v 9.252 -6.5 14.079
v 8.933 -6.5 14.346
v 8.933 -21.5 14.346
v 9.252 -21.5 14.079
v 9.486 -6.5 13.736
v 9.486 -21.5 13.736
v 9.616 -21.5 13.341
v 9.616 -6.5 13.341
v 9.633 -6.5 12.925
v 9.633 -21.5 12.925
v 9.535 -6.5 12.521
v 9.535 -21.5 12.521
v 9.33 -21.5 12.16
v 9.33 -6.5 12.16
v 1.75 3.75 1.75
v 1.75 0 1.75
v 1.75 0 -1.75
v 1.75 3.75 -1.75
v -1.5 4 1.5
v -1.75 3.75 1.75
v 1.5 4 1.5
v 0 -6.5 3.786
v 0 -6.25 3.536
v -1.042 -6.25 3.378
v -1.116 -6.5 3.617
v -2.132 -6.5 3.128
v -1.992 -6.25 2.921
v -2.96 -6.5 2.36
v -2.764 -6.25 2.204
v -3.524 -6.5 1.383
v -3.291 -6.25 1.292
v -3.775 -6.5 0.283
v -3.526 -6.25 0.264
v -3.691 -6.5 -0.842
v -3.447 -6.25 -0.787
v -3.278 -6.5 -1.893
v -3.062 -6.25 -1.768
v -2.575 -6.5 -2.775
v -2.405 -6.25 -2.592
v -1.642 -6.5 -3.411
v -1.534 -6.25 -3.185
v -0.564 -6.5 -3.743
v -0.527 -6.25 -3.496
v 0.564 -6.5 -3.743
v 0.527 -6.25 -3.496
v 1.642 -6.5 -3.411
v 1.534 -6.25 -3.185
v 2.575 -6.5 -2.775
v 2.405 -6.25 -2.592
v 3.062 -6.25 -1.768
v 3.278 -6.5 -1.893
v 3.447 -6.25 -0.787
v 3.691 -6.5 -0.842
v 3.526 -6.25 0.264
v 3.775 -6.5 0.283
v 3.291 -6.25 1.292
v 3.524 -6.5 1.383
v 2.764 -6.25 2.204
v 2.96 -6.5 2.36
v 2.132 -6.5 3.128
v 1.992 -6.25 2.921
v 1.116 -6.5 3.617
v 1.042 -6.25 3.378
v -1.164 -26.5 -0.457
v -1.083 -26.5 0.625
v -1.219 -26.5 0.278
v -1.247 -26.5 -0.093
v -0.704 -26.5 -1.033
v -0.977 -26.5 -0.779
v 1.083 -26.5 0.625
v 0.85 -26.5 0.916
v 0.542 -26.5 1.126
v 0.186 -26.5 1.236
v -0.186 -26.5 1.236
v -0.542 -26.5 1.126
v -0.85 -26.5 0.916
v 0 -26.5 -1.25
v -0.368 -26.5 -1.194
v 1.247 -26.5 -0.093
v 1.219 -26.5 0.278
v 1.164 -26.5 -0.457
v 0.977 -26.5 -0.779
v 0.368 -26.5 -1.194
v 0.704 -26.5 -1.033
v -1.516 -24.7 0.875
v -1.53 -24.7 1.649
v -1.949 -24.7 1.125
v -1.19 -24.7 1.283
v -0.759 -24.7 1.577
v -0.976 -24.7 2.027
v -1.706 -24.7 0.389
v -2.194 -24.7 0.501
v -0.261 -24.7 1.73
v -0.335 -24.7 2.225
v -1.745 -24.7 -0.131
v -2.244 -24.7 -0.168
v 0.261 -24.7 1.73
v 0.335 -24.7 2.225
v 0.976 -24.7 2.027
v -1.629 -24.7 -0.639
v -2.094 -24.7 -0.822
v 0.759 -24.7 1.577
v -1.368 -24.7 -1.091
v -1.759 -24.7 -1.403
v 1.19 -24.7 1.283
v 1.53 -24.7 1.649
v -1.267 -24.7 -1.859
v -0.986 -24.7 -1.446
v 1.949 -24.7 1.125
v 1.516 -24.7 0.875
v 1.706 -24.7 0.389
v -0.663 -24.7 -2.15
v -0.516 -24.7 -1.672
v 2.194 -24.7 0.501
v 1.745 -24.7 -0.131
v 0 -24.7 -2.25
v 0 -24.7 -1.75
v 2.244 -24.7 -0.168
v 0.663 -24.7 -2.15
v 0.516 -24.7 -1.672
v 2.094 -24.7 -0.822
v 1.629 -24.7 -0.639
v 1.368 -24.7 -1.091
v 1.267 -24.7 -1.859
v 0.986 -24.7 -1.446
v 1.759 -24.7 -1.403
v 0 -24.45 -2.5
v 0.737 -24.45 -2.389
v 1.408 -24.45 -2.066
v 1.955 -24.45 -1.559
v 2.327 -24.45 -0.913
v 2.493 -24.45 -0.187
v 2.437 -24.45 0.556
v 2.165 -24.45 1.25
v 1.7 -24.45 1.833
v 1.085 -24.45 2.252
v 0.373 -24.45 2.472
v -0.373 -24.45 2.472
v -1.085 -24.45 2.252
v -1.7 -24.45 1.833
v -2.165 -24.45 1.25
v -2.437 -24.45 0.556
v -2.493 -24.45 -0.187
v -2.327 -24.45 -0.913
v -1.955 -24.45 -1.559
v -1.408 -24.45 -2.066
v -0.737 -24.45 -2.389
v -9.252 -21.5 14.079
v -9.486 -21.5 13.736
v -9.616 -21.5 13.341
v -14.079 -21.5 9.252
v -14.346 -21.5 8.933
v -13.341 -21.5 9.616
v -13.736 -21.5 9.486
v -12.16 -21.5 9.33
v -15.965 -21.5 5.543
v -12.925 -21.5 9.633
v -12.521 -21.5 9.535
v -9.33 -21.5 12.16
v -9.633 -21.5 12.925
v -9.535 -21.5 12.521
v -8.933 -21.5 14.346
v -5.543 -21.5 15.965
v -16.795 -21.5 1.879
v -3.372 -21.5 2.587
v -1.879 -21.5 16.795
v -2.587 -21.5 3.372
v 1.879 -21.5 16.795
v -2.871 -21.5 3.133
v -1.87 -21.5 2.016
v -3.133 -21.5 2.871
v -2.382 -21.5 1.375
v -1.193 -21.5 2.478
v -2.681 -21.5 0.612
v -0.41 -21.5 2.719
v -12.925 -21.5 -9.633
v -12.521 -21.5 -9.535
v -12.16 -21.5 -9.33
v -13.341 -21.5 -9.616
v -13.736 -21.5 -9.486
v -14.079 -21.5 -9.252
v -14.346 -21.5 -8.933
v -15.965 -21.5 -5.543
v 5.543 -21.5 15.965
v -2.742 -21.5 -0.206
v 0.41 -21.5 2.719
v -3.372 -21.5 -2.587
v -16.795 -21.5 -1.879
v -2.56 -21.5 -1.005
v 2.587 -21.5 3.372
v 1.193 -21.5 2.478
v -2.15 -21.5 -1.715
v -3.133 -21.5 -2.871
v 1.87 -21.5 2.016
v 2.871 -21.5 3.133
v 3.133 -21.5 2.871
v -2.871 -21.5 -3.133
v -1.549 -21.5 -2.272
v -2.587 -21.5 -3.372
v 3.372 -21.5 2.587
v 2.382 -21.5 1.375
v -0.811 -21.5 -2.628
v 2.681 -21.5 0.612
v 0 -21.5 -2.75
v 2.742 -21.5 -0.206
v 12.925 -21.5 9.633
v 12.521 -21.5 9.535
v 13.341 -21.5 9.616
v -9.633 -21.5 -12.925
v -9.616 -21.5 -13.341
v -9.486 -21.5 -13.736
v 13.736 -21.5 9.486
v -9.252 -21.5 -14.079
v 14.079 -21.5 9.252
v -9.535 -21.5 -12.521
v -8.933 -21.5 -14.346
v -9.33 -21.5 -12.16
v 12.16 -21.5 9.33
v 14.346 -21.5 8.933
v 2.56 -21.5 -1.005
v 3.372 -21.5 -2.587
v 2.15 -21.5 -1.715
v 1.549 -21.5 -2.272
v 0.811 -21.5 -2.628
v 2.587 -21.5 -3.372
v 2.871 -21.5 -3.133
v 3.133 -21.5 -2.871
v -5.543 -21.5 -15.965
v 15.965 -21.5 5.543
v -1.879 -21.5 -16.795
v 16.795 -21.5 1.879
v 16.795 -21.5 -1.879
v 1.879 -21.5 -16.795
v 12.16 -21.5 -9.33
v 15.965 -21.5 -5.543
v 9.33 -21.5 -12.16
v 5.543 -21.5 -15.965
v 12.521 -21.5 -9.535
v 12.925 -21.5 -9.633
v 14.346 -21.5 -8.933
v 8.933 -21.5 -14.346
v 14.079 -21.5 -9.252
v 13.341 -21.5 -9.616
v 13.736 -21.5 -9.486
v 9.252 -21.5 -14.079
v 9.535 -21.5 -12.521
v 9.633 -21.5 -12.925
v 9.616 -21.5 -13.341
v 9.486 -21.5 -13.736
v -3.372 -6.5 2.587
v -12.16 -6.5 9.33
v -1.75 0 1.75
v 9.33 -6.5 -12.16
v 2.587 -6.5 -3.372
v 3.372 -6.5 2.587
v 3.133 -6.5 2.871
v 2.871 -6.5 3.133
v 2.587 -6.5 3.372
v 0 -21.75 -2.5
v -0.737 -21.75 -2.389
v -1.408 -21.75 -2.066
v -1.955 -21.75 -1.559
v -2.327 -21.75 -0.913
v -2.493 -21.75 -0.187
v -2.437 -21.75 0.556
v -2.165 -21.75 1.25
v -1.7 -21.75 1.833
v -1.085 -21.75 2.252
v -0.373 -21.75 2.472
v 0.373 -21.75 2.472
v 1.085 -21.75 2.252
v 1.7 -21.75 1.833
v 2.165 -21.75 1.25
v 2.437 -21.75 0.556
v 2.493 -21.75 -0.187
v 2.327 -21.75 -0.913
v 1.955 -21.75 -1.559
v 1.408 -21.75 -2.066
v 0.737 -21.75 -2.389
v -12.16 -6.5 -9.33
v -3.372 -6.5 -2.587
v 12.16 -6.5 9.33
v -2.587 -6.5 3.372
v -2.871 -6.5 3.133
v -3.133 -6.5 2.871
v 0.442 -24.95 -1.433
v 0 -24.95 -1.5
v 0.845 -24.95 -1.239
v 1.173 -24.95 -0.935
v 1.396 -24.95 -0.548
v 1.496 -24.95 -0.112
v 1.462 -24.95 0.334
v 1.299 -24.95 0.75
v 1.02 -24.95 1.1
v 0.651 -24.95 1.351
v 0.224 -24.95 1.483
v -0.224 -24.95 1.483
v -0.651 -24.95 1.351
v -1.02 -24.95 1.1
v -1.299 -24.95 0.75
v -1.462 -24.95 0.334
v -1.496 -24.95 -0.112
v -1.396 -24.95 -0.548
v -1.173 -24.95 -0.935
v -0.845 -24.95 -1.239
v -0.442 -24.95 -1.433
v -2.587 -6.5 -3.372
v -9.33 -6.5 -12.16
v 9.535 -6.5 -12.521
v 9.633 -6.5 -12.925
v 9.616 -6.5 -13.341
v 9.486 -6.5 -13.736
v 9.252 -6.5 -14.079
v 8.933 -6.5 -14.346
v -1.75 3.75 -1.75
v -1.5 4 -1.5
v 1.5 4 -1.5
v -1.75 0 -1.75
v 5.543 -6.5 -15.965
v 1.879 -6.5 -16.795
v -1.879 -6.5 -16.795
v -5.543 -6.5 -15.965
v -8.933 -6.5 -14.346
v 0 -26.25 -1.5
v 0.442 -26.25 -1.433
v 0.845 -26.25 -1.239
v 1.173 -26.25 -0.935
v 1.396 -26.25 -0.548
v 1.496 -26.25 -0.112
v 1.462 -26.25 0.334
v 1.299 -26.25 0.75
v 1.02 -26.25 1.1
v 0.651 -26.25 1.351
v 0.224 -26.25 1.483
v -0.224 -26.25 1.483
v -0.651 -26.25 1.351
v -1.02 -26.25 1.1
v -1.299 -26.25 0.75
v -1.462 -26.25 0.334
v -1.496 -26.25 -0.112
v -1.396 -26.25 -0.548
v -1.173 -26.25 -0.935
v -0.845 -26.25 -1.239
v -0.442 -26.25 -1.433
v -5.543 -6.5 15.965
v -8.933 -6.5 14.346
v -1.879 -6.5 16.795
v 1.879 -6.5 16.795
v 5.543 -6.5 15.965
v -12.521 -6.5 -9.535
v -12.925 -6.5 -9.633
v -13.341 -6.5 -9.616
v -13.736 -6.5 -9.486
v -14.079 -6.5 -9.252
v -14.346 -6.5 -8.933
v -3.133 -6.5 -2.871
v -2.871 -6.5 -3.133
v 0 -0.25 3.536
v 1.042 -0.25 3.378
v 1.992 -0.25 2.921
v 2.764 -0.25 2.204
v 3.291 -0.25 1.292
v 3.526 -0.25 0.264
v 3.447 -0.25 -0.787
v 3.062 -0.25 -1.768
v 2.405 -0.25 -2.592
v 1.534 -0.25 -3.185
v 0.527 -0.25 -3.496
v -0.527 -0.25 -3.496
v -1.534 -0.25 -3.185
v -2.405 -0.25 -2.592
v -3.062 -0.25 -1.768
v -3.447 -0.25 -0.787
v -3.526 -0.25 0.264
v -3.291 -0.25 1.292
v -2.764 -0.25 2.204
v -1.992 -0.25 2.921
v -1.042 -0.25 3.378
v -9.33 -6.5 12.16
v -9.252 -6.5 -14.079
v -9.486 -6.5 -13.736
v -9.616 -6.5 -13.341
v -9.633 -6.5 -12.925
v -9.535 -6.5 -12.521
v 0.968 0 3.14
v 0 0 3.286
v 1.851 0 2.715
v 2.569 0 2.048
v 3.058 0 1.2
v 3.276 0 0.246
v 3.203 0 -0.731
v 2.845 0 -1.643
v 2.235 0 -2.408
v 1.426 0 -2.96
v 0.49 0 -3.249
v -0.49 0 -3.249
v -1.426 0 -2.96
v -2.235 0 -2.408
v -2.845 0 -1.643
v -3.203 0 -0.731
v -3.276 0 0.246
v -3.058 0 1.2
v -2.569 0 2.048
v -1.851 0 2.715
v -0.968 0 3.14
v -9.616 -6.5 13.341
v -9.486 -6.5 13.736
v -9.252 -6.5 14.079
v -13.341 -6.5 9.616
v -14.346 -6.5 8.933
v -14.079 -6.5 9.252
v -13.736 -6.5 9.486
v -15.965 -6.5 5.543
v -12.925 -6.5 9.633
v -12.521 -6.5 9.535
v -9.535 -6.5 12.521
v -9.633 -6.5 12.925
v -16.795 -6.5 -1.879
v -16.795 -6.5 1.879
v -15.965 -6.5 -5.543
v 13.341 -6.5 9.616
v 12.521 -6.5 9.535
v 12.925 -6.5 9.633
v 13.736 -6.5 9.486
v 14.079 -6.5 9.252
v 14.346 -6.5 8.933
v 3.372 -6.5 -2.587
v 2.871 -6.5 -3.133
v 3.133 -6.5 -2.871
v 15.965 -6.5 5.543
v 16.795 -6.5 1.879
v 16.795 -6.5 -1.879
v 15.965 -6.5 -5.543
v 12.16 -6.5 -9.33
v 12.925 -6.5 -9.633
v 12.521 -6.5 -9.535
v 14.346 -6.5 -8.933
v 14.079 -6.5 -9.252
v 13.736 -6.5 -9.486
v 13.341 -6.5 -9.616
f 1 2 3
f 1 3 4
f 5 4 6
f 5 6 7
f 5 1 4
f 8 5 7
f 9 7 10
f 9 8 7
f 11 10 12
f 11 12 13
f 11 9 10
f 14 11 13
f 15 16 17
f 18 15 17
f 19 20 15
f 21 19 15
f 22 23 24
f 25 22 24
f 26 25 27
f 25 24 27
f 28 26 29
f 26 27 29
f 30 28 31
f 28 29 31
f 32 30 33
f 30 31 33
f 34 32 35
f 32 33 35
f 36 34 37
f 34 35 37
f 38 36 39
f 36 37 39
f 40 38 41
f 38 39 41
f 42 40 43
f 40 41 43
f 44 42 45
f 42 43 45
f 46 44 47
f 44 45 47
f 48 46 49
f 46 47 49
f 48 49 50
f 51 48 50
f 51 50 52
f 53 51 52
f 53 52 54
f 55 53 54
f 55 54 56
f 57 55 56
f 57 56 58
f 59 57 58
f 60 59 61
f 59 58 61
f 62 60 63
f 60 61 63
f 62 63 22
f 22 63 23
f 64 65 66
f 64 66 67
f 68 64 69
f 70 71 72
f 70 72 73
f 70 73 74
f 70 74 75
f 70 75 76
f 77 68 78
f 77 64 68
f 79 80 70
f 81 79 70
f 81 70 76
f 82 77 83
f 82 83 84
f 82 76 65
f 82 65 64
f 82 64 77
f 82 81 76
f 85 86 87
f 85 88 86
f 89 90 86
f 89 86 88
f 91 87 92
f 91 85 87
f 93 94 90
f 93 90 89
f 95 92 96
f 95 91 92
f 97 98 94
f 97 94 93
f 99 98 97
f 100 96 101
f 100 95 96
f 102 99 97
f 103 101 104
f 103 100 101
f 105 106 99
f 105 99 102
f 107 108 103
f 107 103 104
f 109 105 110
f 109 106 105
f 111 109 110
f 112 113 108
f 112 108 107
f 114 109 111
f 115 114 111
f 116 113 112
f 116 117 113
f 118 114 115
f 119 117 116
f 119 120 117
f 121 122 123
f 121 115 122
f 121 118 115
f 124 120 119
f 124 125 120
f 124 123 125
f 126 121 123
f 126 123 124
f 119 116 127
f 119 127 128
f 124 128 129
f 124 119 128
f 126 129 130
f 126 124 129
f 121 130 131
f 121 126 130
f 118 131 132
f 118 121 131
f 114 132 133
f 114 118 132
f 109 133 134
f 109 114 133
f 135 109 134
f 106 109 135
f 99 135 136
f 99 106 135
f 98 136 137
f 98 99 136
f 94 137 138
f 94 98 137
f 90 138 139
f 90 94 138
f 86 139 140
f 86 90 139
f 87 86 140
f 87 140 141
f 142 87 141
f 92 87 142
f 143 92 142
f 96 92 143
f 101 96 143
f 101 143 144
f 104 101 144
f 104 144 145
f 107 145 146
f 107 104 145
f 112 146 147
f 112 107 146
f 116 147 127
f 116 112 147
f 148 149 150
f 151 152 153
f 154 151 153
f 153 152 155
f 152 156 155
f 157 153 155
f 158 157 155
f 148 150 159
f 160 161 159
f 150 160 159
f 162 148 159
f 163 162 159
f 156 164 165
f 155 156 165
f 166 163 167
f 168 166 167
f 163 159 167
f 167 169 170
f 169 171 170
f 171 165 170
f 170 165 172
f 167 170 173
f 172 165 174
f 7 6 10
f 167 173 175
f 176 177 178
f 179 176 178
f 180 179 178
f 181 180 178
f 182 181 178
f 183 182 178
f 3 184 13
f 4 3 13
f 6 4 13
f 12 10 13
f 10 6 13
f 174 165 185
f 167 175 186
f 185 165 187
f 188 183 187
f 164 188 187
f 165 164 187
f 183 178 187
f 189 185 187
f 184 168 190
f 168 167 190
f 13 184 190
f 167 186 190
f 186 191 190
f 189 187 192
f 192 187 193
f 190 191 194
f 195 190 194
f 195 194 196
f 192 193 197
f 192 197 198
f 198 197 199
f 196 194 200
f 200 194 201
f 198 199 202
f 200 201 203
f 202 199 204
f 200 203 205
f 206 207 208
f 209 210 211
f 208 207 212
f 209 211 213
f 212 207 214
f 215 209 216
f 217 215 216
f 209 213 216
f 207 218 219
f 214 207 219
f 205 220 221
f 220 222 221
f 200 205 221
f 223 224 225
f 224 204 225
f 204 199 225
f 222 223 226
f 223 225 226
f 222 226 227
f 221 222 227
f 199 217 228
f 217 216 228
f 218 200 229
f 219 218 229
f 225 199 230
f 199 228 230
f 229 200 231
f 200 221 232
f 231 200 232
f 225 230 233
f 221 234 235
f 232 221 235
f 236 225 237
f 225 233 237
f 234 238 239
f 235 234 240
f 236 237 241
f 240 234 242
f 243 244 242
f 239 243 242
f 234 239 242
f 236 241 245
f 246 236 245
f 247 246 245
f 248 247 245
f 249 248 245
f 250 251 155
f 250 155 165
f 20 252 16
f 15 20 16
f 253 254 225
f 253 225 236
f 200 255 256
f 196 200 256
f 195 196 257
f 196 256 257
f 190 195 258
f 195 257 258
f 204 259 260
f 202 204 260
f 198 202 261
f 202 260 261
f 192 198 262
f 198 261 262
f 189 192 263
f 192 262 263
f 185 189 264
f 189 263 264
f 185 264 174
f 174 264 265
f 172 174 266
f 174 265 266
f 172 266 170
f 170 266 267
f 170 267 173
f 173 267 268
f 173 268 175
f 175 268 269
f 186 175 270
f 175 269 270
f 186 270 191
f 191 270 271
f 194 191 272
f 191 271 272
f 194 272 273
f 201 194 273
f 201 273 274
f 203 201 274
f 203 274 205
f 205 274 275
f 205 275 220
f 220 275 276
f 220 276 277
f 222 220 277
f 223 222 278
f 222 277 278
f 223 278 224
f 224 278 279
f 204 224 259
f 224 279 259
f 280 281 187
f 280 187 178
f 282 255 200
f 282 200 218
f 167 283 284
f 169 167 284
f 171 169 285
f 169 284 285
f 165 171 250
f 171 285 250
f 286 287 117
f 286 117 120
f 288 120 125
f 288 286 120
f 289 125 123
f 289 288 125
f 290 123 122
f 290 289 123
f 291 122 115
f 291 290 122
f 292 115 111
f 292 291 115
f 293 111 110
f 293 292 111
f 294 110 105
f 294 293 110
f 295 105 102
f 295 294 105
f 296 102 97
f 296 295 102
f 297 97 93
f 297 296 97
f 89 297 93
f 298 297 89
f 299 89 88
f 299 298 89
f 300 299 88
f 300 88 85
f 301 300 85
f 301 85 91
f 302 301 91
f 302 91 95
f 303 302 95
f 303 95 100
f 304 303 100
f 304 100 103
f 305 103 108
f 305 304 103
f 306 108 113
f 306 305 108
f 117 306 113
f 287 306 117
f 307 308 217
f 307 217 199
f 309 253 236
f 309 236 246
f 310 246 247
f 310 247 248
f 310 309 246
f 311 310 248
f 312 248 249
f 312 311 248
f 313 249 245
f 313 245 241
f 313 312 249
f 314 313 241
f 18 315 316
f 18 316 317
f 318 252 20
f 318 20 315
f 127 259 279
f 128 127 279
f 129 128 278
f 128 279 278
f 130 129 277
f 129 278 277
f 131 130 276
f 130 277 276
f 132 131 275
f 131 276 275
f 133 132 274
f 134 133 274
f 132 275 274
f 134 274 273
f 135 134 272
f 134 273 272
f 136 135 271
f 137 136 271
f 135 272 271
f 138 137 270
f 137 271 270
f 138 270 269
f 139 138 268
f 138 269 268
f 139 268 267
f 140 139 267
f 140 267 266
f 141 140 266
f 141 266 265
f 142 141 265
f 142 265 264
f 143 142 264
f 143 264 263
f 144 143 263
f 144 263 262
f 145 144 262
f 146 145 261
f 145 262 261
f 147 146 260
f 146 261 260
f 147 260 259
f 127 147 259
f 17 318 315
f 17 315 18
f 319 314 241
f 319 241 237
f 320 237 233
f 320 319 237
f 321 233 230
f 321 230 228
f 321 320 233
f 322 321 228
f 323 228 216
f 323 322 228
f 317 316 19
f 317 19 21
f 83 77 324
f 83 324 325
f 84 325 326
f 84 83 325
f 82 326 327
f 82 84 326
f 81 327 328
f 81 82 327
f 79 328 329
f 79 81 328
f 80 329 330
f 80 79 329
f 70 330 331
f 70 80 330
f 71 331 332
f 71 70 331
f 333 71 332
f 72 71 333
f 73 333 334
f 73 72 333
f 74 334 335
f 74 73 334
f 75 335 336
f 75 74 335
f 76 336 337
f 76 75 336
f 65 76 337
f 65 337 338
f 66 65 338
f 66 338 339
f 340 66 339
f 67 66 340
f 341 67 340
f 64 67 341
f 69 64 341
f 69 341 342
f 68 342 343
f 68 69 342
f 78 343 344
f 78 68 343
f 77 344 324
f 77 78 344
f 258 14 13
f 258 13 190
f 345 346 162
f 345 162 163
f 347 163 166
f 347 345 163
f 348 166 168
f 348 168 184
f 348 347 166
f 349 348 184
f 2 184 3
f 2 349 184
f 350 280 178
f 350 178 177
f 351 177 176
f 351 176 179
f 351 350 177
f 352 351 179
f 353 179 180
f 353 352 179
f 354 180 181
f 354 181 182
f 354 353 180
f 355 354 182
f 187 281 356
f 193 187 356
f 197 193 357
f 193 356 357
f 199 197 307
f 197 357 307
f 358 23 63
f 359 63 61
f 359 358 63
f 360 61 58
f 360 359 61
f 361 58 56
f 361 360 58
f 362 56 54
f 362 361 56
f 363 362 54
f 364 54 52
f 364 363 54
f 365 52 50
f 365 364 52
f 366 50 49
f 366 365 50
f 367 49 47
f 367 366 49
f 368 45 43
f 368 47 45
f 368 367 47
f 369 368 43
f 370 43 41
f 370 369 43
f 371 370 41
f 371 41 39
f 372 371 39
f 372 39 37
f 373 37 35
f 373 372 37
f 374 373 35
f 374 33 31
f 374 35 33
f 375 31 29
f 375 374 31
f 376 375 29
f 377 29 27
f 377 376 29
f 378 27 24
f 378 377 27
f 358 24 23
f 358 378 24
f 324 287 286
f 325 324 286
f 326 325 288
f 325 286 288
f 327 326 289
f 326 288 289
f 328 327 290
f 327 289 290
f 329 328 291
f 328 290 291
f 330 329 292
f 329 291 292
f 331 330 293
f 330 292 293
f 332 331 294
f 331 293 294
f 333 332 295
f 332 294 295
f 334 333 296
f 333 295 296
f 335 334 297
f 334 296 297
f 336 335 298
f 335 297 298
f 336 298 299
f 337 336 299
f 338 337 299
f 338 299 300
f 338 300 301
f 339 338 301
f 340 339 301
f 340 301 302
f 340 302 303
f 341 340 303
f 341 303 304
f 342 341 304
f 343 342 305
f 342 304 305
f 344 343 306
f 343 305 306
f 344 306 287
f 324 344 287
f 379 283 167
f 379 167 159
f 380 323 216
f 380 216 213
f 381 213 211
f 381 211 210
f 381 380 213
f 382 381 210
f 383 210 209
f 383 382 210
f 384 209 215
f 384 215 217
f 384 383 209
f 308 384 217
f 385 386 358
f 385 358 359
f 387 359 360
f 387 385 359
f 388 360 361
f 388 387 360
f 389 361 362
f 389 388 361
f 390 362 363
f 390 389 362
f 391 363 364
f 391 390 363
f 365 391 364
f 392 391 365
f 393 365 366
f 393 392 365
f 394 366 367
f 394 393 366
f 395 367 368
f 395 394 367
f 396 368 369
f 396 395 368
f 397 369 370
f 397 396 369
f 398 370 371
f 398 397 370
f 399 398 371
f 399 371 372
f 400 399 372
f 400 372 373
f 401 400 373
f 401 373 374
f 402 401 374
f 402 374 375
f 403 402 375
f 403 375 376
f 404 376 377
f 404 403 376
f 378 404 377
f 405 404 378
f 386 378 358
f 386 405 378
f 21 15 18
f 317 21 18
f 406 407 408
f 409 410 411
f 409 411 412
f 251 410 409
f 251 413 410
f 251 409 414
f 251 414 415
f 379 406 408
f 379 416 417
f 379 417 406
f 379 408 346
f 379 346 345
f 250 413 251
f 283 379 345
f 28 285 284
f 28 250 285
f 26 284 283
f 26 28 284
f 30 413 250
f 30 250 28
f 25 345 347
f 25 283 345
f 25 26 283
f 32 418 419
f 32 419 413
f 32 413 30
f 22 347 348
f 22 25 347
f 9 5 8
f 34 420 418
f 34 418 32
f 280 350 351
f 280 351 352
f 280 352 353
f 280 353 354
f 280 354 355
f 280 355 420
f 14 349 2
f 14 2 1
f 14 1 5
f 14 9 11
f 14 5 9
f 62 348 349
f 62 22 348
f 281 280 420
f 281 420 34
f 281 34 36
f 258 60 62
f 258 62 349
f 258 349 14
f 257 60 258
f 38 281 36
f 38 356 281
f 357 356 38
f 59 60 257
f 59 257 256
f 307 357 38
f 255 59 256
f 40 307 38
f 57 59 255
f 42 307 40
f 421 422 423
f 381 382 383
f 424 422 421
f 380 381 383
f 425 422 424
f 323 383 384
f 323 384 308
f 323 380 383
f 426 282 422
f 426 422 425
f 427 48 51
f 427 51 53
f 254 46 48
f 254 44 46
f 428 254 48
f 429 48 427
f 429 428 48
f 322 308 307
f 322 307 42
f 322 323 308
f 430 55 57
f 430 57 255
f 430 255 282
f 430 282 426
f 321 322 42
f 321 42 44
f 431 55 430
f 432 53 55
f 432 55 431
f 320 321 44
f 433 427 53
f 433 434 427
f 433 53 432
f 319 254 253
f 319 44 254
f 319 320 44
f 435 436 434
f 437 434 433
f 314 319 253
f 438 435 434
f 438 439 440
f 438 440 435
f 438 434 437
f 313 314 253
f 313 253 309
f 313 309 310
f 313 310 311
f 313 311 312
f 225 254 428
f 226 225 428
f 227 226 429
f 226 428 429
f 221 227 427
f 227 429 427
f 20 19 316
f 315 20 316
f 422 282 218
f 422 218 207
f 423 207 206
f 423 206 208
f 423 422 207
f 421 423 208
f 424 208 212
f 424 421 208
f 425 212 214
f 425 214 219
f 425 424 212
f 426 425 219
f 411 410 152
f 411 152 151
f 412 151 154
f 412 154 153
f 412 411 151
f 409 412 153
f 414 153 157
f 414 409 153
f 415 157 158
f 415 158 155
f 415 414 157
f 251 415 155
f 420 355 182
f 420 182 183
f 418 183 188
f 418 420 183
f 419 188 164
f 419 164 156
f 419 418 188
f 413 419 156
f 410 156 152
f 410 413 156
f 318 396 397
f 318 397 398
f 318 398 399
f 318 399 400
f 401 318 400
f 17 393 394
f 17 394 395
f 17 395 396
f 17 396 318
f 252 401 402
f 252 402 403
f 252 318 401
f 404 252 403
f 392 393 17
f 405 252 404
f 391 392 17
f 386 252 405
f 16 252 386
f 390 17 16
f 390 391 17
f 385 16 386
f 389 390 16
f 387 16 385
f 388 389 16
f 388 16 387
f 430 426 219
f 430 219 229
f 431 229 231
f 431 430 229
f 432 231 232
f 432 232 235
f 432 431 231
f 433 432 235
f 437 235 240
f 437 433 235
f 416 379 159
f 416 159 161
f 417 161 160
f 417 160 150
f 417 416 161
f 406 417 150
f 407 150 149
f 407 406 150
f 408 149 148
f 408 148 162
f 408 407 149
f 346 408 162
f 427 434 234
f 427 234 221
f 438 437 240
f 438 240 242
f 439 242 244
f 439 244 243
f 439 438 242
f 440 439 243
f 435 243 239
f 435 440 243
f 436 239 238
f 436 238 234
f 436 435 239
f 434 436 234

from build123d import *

# Parameters (mm, degrees)
SKETCH1_R           = 3.535533906
BOSS_EXTRUDE1_DEPTH = 6.5
SKETCH1_6_W         = 3.5
SKETCH1_6_H         = 3.5
BOSS_EXTRUDE2_DEPTH = 4
SKETCH4_R           = 4.25
BOSS_EXTRUDE5_DEPTH = 15
SKETCH2_R           = 2.5
BOSS_EXTRUDE3_DEPTH = 3.2
SKETCH3_R           = 1.5
BOSS_EXTRUDE4_DEPTH = 1.8
BOSS_EXTRUDE6_DEPTH = 15
CHAMFER1_SIZE       = 0.25


with BuildPart() as part:
    # Sketch1 → Boss-Extrude1 (new body)
    with BuildSketch(Plane(origin=(0, 0, 0), x_dir=(1, 0, 0), z_dir=(0, 1, 0))):
        with Locations(Location((0, 0, 0), (0, 0, 270))):
            Circle(SKETCH1_R)
    extrude(amount=-BOSS_EXTRUDE1_DEPTH)

    # Sketch1<6> → Boss-Extrude2 (add)
    with BuildSketch(Plane(origin=(0, 0, 0), x_dir=(1, 0, 0), z_dir=(0, 1, 0))):
        Rectangle(SKETCH1_6_W, SKETCH1_6_H)
    extrude(amount=BOSS_EXTRUDE2_DEPTH)

    # Sketch4 → Boss-Extrude5 (add)
    with BuildSketch(Plane.XZ.offset(6.5)):
        with Locations(Location((0, 0, 0), (0, 0, 270))):
            Circle(SKETCH4_R)
    extrude(amount=BOSS_EXTRUDE5_DEPTH)

    # Sketch2 → Boss-Extrude3 (add)
    with BuildSketch(Plane.XZ.offset(21.5)):
        with Locations(Location((0, 0, 0), (0, 0, 270))):
            Circle(SKETCH2_R)
    extrude(amount=BOSS_EXTRUDE3_DEPTH)

    # Sketch3 → Boss-Extrude4 (add)
    with BuildSketch(Plane.XZ.offset(24.7)):
        with Locations(Location((0, 0, 0), (0, 0, 270))):
            Circle(SKETCH3_R)
    extrude(amount=BOSS_EXTRUDE4_DEPTH)

    # Sketch5 → Boss-Extrude6 (add)
    with BuildSketch(Plane(origin=(0, -6.5, 0), x_dir=(1, 0, 0), z_dir=(0, 1, 0))):
        with BuildLine():
            Line((-9.330348818, 12.159547317), (-1.19003001, 1.550877304))
            ThreePointArc((-1.19003001, 1.550877304), (0, 0.964019448), (1.19003001, 1.550877304))
            Line((1.19003001, 1.550877304), (9.330348818, 12.159547317))
            ThreePointArc((9.330348818, 12.159547317), (9.616170653, 13.340759097), (8.933207003, 14.346003368))
            ThreePointArc((8.933207003, 14.346003368), (0, 16.9), (-8.933207003, 14.346003368))
            ThreePointArc((-8.933207003, 14.346003368), (-9.616170653, 13.340759097), (-9.330348818, 12.159547317))
        make_face()
        with BuildLine():
            Line((12.159547317, 9.330348818), (1.550877304, 1.19003001))
            ThreePointArc((1.550877304, 1.19003001), (0.964019448, 0), (1.550877304, -1.19003001))
            Line((1.550877304, -1.19003001), (12.159547317, -9.330348818))
            ThreePointArc((12.159547317, -9.330348818), (13.340759097, -9.616170653), (14.346003368, -8.933207003))
            ThreePointArc((14.346003368, -8.933207003), (16.9, 0), (14.346003368, 8.933207003))
            ThreePointArc((14.346003368, 8.933207003), (13.340759097, 9.616170653), (12.159547317, 9.330348818))
        make_face()
        with BuildLine():
            Line((9.330348818, -12.159547317), (1.19003001, -1.550877304))
            ThreePointArc((1.19003001, -1.550877304), (0, -0.964019448), (-1.19003001, -1.550877304))
            Line((-1.19003001, -1.550877304), (-9.330348818, -12.159547317))
            ThreePointArc((-9.330348818, -12.159547317), (-9.616170653, -13.340759097), (-8.933207003, -14.346003368))
            ThreePointArc((-8.933207003, -14.346003368), (0, -16.9), (8.933207003, -14.346003368))
            ThreePointArc((8.933207003, -14.346003368), (9.616170653, -13.340759097), (9.330348818, -12.159547317))
        make_face()
        with BuildLine():
            Line((-12.159547317, -9.330348818), (-1.550877304, -1.19003001))
            ThreePointArc((-1.550877304, -1.19003001), (-0.964019448, 0), (-1.550877304, 1.19003001))
            Line((-1.550877304, 1.19003001), (-12.159547317, 9.330348818))
            ThreePointArc((-12.159547317, 9.330348818), (-13.340759097, 9.616170653), (-14.346003368, 8.933207003))
            ThreePointArc((-14.346003368, 8.933207003), (-16.9, 0), (-14.346003368, -8.933207003))
            ThreePointArc((-14.346003368, -8.933207003), (-13.340759097, -9.616170653), (-12.159547317, -9.330348818))
        make_face()
    extrude(amount=-BOSS_EXTRUDE6_DEPTH)

    # Chamfer1
    chamfer1_edges = [part.edges().sort_by_distance(p)[0] for p in [
        (0, -6.5, -3.535533906),
        (0, 0, -3.535533906),
        (0, -21.5, 2.5),
        (0, -24.7, 2.5),
        (0, -24.7, 1.5),
        (0, -26.5, 1.5),
        (1.75, 4, 0),
        (0, 4, -1.75),
        (-1.75, 4, 0),
        (0, 4, 1.75),
    ]]
    chamfer(chamfer1_edges, length=CHAMFER1_SIZE)


solid = part.part
